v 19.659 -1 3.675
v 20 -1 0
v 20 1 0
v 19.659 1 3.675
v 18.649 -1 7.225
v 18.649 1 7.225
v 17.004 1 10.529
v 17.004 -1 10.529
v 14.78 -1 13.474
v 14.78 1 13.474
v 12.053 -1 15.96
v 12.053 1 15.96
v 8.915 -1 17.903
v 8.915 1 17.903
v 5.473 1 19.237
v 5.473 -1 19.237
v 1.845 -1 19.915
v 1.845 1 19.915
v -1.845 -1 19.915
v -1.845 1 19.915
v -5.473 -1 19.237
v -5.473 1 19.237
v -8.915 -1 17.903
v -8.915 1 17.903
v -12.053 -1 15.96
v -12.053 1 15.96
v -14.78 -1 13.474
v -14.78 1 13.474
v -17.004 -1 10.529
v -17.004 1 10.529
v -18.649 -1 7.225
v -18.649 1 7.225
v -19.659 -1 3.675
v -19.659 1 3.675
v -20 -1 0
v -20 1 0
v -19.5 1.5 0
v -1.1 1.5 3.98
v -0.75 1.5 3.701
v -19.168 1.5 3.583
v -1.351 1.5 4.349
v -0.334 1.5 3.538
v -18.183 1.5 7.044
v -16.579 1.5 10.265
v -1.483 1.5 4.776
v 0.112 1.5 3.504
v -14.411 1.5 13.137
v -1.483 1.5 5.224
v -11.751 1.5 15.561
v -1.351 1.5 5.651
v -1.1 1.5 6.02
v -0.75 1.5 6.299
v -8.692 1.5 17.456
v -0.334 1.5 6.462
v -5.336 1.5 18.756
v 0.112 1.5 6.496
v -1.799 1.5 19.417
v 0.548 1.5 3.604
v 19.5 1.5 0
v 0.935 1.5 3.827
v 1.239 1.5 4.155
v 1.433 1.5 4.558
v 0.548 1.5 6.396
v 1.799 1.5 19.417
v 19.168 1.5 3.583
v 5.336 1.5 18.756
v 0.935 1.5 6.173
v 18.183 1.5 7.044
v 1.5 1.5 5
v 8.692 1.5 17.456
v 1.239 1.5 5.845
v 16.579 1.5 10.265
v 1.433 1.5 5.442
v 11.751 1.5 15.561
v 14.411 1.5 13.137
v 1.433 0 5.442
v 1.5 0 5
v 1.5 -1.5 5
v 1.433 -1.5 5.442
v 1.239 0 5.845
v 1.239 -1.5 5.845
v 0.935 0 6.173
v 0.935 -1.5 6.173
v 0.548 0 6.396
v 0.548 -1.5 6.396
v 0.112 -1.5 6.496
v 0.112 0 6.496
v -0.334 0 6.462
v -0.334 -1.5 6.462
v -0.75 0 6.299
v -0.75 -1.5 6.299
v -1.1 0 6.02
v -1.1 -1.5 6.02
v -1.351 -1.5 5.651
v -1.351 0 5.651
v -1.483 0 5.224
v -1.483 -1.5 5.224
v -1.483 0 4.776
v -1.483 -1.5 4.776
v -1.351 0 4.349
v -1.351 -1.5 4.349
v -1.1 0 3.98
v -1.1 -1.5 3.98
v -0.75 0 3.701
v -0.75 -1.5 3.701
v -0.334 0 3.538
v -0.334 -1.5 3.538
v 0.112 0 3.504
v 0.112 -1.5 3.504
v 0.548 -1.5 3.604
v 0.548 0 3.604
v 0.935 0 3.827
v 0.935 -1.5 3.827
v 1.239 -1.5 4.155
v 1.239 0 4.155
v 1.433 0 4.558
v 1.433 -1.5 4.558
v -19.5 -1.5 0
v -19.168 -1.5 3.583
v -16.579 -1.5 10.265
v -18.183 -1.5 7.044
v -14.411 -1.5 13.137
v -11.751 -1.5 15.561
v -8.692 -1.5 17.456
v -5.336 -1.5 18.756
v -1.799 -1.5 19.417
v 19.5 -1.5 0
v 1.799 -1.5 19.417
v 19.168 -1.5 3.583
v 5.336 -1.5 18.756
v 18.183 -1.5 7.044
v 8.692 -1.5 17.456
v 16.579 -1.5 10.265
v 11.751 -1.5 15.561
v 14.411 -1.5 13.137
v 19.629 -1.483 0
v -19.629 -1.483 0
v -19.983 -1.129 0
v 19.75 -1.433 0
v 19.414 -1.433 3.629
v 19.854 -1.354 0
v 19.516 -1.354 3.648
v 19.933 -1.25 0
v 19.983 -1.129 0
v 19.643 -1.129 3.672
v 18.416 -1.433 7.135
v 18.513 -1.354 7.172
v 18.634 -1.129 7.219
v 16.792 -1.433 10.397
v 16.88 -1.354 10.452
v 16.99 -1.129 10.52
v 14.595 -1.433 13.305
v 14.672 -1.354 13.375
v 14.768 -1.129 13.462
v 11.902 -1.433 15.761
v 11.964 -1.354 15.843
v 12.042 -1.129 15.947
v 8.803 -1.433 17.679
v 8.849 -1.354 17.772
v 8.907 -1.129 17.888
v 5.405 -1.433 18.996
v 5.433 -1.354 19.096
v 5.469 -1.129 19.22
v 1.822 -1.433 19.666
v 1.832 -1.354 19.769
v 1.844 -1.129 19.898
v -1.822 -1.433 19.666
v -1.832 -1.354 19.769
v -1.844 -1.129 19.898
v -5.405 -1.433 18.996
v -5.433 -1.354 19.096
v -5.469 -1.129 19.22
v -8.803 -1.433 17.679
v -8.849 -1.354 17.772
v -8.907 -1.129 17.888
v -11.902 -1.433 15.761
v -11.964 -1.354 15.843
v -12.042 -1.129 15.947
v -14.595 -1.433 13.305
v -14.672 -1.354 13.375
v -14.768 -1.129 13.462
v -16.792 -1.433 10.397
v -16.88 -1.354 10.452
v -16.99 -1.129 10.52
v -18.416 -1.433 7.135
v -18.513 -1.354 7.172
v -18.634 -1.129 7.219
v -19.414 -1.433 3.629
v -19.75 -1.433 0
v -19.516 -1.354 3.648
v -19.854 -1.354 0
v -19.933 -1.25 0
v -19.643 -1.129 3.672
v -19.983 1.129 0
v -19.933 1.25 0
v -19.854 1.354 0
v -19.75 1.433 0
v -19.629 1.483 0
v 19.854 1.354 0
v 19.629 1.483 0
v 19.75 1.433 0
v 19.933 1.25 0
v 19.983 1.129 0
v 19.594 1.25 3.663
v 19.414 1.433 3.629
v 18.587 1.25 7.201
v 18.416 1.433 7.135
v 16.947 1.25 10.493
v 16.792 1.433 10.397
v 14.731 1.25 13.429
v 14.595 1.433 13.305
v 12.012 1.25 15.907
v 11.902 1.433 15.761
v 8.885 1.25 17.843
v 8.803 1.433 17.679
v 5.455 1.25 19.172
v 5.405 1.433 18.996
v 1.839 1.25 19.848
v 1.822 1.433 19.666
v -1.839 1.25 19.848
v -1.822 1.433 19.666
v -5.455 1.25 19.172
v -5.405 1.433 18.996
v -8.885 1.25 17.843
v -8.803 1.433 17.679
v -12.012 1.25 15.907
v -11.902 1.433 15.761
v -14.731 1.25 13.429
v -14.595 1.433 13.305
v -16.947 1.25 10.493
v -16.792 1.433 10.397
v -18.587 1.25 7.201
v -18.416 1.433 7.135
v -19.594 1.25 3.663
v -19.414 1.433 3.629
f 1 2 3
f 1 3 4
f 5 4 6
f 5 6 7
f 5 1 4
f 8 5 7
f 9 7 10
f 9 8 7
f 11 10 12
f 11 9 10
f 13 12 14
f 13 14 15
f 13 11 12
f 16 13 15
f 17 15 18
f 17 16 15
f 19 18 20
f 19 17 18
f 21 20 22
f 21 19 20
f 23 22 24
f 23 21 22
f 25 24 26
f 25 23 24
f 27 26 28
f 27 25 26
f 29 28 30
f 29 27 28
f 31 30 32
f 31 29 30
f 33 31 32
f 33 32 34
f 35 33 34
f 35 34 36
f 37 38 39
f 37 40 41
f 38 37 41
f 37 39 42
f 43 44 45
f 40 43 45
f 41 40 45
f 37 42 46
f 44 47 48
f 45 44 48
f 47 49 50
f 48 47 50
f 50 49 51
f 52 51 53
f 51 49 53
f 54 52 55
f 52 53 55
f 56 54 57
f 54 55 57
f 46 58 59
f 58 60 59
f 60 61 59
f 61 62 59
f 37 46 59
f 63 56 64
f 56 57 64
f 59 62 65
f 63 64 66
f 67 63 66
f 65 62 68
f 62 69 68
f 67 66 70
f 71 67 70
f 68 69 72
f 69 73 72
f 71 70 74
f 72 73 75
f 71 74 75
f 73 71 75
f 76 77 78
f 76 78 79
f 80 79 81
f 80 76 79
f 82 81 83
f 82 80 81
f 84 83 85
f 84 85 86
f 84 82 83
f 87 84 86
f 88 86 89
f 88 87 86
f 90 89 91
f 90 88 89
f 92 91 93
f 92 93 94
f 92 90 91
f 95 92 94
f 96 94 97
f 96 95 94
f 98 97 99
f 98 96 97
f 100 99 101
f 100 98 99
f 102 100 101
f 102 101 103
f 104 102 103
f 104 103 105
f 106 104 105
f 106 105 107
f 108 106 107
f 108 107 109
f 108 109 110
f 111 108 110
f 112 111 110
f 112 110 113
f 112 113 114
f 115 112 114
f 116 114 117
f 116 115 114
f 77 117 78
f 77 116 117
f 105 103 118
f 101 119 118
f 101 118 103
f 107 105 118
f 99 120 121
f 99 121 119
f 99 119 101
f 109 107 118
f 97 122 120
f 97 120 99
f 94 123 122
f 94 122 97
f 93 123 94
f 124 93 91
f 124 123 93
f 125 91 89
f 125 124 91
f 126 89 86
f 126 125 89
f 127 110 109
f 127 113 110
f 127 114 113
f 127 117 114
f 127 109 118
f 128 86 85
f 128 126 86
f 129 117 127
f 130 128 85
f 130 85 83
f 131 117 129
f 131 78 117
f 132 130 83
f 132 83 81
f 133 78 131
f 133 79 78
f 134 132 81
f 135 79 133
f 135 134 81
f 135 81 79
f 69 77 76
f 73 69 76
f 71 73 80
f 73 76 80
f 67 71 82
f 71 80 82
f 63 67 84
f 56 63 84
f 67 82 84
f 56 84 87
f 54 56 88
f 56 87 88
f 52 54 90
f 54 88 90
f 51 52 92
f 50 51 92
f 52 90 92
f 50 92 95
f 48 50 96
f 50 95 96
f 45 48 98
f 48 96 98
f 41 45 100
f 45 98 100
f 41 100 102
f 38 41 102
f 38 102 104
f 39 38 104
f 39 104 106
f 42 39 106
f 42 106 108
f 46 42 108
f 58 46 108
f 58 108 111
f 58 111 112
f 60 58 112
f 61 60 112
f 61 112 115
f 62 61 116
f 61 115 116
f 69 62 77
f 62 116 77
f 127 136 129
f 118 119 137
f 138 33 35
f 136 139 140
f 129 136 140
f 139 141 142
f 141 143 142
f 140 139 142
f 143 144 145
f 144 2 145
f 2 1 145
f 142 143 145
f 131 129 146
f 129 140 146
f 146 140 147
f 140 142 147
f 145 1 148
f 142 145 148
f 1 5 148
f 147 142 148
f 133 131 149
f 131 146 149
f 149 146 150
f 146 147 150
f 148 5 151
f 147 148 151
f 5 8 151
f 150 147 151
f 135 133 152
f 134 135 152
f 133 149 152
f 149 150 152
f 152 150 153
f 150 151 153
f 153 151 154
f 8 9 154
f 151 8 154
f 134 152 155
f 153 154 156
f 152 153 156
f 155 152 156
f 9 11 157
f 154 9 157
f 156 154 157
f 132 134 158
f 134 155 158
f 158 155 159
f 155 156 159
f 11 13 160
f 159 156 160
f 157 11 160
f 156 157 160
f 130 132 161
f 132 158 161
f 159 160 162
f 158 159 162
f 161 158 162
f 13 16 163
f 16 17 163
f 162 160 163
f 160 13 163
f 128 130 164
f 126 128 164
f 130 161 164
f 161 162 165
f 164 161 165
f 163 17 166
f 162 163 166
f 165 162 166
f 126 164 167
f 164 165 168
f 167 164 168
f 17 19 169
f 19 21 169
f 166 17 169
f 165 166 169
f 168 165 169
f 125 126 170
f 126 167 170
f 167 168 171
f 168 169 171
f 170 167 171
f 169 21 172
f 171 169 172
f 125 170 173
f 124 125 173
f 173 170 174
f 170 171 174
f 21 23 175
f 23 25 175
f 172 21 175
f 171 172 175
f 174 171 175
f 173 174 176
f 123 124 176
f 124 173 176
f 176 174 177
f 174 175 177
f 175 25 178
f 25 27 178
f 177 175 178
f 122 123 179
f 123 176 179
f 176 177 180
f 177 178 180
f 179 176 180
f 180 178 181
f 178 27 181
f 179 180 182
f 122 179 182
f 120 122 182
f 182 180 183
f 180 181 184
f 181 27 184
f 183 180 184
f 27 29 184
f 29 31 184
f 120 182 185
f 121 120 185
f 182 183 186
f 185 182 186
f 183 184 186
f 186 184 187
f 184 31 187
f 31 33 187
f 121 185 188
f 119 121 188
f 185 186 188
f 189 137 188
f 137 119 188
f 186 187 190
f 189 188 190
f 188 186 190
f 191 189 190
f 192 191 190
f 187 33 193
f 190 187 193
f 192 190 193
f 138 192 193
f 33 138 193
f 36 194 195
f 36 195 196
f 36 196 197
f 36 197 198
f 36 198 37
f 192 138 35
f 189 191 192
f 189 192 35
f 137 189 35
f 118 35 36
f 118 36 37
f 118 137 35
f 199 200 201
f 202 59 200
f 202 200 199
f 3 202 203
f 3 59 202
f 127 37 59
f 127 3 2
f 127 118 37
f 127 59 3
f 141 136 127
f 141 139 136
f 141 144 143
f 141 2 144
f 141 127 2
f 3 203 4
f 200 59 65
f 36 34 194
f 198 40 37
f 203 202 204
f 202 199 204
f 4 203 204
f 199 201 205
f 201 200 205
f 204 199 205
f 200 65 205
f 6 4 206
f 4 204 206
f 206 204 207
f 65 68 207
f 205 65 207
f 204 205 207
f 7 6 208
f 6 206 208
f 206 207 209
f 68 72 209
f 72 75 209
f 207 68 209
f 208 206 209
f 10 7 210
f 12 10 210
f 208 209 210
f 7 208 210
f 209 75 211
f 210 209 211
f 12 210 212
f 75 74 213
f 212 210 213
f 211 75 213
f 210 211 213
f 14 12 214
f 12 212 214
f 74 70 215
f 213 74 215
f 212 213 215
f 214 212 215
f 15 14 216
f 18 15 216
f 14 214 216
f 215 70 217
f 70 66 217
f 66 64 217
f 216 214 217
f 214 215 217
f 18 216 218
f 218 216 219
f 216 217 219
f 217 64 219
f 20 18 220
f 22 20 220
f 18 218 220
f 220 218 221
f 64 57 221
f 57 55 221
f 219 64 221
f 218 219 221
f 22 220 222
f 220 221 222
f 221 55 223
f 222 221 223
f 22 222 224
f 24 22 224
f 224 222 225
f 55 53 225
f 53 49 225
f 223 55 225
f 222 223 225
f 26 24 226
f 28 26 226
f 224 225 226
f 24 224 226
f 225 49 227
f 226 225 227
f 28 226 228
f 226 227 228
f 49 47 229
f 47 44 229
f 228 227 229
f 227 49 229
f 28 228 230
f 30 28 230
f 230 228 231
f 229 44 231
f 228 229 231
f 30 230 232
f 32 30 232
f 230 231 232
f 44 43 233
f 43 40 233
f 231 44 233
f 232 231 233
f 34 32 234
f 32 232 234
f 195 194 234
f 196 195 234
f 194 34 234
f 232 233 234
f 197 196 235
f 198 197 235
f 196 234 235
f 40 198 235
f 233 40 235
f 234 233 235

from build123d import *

# Parameters (mm, degrees)
F0_R          = 1.5
F1_DEPTH      = 1.5
F1_DEPTH_BACK = 1.5
F2_R          = 0.5


with BuildPart() as f1:
    # F0 (on Front) → F1 (new body, two sides)
    with BuildSketch(Plane.XZ) as f1_sk:
        with BuildLine():
            Line((-20, 0), (20, 0))
            ThreePointArc((20, 0), (0, 20), (-20, 0))
        make_face()
        with Locations((0, 5)):
            Circle(F0_R, mode=Mode.SUBTRACT)
    extrude(amount=F1_DEPTH)
    extrude(f1_sk.sketch, amount=-F1_DEPTH_BACK)

    # F2
    f2_edges = [f1.edges().sort_by_distance(p)[0] for p in [
        (0, -1.5, 20),
        (0, 1.5, 20),
    ]]
    fillet(f2_edges, radius=F2_R)


solid = f1.part
